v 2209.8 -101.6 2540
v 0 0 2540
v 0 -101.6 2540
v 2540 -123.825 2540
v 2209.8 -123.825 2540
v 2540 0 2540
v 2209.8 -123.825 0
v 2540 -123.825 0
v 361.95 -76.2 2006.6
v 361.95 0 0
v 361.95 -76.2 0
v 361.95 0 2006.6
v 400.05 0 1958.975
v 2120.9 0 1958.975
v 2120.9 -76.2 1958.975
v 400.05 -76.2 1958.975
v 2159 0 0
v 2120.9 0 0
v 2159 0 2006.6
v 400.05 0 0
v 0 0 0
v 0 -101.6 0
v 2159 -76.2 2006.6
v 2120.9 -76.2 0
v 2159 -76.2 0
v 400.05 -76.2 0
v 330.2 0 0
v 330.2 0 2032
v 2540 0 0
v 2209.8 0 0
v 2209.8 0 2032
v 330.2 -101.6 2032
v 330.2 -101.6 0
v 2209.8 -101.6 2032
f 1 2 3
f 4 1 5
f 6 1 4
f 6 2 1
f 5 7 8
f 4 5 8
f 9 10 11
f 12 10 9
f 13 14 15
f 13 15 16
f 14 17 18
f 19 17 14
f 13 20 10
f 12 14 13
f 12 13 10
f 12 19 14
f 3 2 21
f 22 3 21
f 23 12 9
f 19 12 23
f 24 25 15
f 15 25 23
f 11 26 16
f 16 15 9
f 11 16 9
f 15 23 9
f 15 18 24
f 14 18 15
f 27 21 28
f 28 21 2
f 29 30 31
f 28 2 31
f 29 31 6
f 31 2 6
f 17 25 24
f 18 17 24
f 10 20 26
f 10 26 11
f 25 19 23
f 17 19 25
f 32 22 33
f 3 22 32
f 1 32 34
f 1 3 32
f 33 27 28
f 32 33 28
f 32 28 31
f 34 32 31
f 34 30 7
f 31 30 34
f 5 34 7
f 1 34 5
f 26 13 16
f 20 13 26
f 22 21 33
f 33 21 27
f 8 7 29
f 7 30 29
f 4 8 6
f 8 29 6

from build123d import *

# Parameters (mm, degrees)
F1_DEPTH = 101.6
F2_W     = 330.2
F2_H     = 2540
F3_DEPTH = 22.225
F5_DEPTH = 76.2


with BuildPart() as f1:
    # F0 (on Front) → F1 (new body)
    with BuildSketch(Plane.XZ):
        Polygon((0, 2540), (0, 0), (330.2, 0), (330.2, 2032), (2209.8, 2032), (2209.8, 0), (2540, 0), (2540, 2540), align=None)
    extrude(amount=F1_DEPTH)

    # F2 (on face) → F3 (join)
    with BuildSketch(Plane.XZ.offset(101.6)):
        with Locations((2374.9, 1270)):
            Rectangle(F2_W, F2_H)
    extrude(amount=F3_DEPTH)


with BuildPart() as f5:
    # F4 (on face) → F5 (new body)
    with BuildSketch(Plane(origin=(0, 0, 0), x_dir=(-1, 0, 0), z_dir=(0, 1, 0))):
        Polygon((-2159, 2006.6), (-2159, 0), (-2120.9, 0), (-2120.9, 1958.975), (-400.05, 1958.975), (-400.05, 0), (-361.95, 0), (-361.95, 2006.6), align=None)
    extrude(amount=-F5_DEPTH)


solid = Compound([f1.part, f5.part])
